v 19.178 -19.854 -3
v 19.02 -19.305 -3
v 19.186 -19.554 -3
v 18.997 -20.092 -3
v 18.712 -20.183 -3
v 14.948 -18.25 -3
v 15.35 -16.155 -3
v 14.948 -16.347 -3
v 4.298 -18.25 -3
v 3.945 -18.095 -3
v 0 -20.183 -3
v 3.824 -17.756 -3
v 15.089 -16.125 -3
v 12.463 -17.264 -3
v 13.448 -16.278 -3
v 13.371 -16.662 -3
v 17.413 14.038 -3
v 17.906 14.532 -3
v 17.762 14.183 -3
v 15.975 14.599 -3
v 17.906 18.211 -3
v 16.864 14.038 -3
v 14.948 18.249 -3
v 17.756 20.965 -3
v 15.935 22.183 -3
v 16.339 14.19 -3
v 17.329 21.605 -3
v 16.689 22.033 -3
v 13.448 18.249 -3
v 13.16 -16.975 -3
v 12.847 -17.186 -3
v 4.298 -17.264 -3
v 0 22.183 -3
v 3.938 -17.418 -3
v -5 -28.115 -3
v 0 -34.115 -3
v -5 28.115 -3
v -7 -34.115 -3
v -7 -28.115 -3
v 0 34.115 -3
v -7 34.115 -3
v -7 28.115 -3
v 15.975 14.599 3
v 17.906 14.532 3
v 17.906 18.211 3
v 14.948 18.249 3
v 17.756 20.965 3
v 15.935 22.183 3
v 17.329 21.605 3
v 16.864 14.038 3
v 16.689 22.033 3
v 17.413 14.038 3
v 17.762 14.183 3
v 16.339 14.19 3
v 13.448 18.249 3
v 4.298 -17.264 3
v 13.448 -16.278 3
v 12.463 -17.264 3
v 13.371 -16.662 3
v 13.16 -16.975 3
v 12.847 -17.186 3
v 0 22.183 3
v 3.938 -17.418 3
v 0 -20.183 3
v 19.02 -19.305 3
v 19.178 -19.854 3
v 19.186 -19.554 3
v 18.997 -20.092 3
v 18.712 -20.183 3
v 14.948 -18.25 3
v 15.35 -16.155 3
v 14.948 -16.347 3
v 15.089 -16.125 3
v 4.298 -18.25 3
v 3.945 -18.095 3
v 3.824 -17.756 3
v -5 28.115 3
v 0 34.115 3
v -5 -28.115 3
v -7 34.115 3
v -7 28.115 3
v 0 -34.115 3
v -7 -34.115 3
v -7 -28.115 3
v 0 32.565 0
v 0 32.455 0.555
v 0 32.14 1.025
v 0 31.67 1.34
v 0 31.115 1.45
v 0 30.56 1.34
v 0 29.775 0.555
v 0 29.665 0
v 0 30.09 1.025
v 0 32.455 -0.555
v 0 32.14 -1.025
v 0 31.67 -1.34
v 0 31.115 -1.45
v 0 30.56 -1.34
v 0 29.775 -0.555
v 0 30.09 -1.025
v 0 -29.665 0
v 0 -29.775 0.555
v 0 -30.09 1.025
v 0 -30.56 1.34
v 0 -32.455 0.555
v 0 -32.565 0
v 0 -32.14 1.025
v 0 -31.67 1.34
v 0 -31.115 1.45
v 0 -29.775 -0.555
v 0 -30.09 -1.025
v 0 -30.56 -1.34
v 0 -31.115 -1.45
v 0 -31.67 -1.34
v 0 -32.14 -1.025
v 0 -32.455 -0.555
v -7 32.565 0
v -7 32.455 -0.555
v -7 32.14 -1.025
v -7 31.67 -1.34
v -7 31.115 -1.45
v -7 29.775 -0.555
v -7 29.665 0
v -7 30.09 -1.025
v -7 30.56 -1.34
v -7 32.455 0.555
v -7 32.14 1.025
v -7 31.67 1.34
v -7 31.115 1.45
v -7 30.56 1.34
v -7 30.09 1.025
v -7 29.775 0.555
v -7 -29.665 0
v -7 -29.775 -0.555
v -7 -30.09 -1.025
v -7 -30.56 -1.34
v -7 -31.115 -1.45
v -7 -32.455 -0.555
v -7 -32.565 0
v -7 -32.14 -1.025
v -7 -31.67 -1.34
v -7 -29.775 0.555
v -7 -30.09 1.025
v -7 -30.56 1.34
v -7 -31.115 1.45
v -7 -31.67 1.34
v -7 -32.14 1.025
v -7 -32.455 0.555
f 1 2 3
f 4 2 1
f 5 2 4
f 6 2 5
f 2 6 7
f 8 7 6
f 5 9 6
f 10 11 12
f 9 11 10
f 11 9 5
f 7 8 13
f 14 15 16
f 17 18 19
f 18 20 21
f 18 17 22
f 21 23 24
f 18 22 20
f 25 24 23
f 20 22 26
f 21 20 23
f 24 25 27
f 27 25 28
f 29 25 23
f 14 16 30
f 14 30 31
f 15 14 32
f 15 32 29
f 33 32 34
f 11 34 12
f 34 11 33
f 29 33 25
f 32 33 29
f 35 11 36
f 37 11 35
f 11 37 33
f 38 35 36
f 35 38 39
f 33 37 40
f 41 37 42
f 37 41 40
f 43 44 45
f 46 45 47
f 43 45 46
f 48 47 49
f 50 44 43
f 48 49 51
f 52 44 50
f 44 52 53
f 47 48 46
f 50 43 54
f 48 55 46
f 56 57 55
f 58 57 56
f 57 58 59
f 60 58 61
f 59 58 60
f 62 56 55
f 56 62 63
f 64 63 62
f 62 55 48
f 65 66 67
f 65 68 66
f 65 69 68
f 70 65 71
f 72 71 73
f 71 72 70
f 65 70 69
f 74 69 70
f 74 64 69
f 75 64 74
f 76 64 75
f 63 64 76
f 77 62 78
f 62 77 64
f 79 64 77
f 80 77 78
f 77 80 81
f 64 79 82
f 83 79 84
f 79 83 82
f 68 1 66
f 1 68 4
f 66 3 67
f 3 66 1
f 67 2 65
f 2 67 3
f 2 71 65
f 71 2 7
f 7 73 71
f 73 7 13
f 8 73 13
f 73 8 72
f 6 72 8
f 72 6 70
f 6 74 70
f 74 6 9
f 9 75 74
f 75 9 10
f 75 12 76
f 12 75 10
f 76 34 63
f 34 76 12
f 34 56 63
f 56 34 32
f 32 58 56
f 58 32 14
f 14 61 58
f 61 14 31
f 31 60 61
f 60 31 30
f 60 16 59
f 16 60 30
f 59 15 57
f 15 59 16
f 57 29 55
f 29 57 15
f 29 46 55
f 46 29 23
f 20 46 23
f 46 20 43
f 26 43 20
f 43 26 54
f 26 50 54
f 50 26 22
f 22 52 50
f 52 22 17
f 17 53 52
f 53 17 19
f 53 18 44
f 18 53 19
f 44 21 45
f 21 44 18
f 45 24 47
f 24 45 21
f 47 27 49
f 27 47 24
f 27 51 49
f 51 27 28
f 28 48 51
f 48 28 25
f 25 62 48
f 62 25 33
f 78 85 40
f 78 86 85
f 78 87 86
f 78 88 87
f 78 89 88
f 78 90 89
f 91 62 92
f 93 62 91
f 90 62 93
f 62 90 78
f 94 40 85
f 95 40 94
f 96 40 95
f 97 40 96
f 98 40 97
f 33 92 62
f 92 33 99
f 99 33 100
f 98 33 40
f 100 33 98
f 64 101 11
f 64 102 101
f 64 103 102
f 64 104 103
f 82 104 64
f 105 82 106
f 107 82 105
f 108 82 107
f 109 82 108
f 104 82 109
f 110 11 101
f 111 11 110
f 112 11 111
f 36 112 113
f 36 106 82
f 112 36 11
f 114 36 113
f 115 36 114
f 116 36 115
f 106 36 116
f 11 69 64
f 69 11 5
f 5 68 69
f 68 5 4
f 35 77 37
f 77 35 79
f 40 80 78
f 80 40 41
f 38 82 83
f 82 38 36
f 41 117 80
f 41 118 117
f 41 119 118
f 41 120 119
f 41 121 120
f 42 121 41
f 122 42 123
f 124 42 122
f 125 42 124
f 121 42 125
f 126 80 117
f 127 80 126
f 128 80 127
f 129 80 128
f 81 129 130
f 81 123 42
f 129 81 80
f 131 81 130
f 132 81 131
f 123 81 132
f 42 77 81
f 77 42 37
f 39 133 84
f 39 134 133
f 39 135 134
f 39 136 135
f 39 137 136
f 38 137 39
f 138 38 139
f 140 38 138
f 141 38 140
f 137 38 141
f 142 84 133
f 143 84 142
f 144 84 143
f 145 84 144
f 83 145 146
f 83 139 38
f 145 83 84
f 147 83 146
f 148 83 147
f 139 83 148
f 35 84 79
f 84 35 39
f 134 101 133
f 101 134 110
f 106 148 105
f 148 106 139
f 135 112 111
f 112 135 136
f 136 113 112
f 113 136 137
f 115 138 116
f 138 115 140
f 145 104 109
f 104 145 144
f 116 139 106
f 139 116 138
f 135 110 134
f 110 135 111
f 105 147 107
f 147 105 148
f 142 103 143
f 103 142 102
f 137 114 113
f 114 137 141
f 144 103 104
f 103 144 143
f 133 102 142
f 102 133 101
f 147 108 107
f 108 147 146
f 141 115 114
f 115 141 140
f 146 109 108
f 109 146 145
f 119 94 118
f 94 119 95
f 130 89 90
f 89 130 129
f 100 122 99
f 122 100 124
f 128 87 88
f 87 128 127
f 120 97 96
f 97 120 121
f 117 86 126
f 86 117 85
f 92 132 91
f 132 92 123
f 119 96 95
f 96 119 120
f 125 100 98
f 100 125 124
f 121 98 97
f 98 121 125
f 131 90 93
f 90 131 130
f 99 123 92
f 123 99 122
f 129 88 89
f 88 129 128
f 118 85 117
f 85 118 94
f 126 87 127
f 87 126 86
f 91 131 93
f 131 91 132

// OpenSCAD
// Remix of http://www.thingiverse.com/thing:806093

//Clip thickness
CLIP_H = 6;
// Holes diameter
HOLE_DIAMETER = 2.9;
// Distance between the 2 holes
PILLAR_PITCH = 62.23;

// Height of the mounting bar
MOUNT_H = 5;
// Height of pillars
PILLAR_H = 2;

PILLAR_1_Y_OFFSET = PILLAR_PITCH/2;
PILLAR_2_Y_OFFSET = -PILLAR_PITCH/2;

module shape()
{
    p = [[9.403850,21.092300],[9.584450,20.854000],[9.593250,20.554200],[9.427250,20.305200],[5.756350,17.154800],[5.495650,17.124500],[5.354950,17.347200],[5.354950,19.249500],[-5.295400,19.249500],[-5.647940,19.095200],[-5.769030,18.756400],[-5.654770,18.417500],[-5.295400,18.264200],[2.869650,18.264200],[3.253450,18.186000],[3.566950,17.975100],[3.777850,17.661600],[3.854950,17.277800],[3.854950,-17.249500],[5.354950,-17.249500],[6.381350,-13.599100],[6.745650,-13.189900],[7.271050,-13.038600],[7.819850,-13.038600],[8.168450,-13.183100],[8.312950,-13.531700],[8.312950,-17.211400],[8.162650,-19.965300],[7.735850,-20.605000],[7.096250,-21.032700],[6.341350,-21.183100],[-9.593250,-21.183100],[-9.593250,21.183100],[9.118650,21.183100]];
    
    xm = min([ for (x=p) x[0] ]);
    ym = min([ for (x=p) x[1] ]); 
    echo([xm, ym]);
    translate([0,22.183,0]) // This offset is know by displaying 
                            // DXF file a CAD software
        rotate([180,0,0])
            translate([-xm, -ym])
                polygon(p);
}

module din_clip() {

	difference() {
		
		union() {
            linear_extrude(height=CLIP_H, center=true, convexity=5) {
                //import(file="PCB_din_clip.dxf", $fn=64);
                shape();
            }
		      
            translate([-MOUNT_H/2, 0, 0]) {
                cube([MOUNT_H,PILLAR_PITCH+6,CLIP_H], center=true);
            }
            
            translate([-PILLAR_H/2-MOUNT_H, PILLAR_1_Y_OFFSET, 0]) {
				rotate([0, 0, 0]) {
					cube([PILLAR_H,6,CLIP_H], center = true);
				}
            }

            translate([-PILLAR_H/2-MOUNT_H, PILLAR_2_Y_OFFSET, 0]) {
				rotate([0, 0, 0]) {
					cube([PILLAR_H,6,CLIP_H], center = true);
				}
            }
		}

		union() {
			translate([-PILLAR_H-MOUNT_H-0.5, PILLAR_2_Y_OFFSET, 0]) {
				rotate([0, 90, 0]) {
					cylinder(h= PILLAR_H+MOUNT_H+1, r = HOLE_DIAMETER / 2, $fn = 16);
				}
			}
			translate([-PILLAR_H-MOUNT_H-0.5, PILLAR_1_Y_OFFSET, 0]) {
				rotate([0, 90, 0]) {
					cylinder(h= PILLAR_H+MOUNT_H+1, r = HOLE_DIAMETER / 2, $fn = 16);
				}
			}
		}
    }
}

din_clip();
